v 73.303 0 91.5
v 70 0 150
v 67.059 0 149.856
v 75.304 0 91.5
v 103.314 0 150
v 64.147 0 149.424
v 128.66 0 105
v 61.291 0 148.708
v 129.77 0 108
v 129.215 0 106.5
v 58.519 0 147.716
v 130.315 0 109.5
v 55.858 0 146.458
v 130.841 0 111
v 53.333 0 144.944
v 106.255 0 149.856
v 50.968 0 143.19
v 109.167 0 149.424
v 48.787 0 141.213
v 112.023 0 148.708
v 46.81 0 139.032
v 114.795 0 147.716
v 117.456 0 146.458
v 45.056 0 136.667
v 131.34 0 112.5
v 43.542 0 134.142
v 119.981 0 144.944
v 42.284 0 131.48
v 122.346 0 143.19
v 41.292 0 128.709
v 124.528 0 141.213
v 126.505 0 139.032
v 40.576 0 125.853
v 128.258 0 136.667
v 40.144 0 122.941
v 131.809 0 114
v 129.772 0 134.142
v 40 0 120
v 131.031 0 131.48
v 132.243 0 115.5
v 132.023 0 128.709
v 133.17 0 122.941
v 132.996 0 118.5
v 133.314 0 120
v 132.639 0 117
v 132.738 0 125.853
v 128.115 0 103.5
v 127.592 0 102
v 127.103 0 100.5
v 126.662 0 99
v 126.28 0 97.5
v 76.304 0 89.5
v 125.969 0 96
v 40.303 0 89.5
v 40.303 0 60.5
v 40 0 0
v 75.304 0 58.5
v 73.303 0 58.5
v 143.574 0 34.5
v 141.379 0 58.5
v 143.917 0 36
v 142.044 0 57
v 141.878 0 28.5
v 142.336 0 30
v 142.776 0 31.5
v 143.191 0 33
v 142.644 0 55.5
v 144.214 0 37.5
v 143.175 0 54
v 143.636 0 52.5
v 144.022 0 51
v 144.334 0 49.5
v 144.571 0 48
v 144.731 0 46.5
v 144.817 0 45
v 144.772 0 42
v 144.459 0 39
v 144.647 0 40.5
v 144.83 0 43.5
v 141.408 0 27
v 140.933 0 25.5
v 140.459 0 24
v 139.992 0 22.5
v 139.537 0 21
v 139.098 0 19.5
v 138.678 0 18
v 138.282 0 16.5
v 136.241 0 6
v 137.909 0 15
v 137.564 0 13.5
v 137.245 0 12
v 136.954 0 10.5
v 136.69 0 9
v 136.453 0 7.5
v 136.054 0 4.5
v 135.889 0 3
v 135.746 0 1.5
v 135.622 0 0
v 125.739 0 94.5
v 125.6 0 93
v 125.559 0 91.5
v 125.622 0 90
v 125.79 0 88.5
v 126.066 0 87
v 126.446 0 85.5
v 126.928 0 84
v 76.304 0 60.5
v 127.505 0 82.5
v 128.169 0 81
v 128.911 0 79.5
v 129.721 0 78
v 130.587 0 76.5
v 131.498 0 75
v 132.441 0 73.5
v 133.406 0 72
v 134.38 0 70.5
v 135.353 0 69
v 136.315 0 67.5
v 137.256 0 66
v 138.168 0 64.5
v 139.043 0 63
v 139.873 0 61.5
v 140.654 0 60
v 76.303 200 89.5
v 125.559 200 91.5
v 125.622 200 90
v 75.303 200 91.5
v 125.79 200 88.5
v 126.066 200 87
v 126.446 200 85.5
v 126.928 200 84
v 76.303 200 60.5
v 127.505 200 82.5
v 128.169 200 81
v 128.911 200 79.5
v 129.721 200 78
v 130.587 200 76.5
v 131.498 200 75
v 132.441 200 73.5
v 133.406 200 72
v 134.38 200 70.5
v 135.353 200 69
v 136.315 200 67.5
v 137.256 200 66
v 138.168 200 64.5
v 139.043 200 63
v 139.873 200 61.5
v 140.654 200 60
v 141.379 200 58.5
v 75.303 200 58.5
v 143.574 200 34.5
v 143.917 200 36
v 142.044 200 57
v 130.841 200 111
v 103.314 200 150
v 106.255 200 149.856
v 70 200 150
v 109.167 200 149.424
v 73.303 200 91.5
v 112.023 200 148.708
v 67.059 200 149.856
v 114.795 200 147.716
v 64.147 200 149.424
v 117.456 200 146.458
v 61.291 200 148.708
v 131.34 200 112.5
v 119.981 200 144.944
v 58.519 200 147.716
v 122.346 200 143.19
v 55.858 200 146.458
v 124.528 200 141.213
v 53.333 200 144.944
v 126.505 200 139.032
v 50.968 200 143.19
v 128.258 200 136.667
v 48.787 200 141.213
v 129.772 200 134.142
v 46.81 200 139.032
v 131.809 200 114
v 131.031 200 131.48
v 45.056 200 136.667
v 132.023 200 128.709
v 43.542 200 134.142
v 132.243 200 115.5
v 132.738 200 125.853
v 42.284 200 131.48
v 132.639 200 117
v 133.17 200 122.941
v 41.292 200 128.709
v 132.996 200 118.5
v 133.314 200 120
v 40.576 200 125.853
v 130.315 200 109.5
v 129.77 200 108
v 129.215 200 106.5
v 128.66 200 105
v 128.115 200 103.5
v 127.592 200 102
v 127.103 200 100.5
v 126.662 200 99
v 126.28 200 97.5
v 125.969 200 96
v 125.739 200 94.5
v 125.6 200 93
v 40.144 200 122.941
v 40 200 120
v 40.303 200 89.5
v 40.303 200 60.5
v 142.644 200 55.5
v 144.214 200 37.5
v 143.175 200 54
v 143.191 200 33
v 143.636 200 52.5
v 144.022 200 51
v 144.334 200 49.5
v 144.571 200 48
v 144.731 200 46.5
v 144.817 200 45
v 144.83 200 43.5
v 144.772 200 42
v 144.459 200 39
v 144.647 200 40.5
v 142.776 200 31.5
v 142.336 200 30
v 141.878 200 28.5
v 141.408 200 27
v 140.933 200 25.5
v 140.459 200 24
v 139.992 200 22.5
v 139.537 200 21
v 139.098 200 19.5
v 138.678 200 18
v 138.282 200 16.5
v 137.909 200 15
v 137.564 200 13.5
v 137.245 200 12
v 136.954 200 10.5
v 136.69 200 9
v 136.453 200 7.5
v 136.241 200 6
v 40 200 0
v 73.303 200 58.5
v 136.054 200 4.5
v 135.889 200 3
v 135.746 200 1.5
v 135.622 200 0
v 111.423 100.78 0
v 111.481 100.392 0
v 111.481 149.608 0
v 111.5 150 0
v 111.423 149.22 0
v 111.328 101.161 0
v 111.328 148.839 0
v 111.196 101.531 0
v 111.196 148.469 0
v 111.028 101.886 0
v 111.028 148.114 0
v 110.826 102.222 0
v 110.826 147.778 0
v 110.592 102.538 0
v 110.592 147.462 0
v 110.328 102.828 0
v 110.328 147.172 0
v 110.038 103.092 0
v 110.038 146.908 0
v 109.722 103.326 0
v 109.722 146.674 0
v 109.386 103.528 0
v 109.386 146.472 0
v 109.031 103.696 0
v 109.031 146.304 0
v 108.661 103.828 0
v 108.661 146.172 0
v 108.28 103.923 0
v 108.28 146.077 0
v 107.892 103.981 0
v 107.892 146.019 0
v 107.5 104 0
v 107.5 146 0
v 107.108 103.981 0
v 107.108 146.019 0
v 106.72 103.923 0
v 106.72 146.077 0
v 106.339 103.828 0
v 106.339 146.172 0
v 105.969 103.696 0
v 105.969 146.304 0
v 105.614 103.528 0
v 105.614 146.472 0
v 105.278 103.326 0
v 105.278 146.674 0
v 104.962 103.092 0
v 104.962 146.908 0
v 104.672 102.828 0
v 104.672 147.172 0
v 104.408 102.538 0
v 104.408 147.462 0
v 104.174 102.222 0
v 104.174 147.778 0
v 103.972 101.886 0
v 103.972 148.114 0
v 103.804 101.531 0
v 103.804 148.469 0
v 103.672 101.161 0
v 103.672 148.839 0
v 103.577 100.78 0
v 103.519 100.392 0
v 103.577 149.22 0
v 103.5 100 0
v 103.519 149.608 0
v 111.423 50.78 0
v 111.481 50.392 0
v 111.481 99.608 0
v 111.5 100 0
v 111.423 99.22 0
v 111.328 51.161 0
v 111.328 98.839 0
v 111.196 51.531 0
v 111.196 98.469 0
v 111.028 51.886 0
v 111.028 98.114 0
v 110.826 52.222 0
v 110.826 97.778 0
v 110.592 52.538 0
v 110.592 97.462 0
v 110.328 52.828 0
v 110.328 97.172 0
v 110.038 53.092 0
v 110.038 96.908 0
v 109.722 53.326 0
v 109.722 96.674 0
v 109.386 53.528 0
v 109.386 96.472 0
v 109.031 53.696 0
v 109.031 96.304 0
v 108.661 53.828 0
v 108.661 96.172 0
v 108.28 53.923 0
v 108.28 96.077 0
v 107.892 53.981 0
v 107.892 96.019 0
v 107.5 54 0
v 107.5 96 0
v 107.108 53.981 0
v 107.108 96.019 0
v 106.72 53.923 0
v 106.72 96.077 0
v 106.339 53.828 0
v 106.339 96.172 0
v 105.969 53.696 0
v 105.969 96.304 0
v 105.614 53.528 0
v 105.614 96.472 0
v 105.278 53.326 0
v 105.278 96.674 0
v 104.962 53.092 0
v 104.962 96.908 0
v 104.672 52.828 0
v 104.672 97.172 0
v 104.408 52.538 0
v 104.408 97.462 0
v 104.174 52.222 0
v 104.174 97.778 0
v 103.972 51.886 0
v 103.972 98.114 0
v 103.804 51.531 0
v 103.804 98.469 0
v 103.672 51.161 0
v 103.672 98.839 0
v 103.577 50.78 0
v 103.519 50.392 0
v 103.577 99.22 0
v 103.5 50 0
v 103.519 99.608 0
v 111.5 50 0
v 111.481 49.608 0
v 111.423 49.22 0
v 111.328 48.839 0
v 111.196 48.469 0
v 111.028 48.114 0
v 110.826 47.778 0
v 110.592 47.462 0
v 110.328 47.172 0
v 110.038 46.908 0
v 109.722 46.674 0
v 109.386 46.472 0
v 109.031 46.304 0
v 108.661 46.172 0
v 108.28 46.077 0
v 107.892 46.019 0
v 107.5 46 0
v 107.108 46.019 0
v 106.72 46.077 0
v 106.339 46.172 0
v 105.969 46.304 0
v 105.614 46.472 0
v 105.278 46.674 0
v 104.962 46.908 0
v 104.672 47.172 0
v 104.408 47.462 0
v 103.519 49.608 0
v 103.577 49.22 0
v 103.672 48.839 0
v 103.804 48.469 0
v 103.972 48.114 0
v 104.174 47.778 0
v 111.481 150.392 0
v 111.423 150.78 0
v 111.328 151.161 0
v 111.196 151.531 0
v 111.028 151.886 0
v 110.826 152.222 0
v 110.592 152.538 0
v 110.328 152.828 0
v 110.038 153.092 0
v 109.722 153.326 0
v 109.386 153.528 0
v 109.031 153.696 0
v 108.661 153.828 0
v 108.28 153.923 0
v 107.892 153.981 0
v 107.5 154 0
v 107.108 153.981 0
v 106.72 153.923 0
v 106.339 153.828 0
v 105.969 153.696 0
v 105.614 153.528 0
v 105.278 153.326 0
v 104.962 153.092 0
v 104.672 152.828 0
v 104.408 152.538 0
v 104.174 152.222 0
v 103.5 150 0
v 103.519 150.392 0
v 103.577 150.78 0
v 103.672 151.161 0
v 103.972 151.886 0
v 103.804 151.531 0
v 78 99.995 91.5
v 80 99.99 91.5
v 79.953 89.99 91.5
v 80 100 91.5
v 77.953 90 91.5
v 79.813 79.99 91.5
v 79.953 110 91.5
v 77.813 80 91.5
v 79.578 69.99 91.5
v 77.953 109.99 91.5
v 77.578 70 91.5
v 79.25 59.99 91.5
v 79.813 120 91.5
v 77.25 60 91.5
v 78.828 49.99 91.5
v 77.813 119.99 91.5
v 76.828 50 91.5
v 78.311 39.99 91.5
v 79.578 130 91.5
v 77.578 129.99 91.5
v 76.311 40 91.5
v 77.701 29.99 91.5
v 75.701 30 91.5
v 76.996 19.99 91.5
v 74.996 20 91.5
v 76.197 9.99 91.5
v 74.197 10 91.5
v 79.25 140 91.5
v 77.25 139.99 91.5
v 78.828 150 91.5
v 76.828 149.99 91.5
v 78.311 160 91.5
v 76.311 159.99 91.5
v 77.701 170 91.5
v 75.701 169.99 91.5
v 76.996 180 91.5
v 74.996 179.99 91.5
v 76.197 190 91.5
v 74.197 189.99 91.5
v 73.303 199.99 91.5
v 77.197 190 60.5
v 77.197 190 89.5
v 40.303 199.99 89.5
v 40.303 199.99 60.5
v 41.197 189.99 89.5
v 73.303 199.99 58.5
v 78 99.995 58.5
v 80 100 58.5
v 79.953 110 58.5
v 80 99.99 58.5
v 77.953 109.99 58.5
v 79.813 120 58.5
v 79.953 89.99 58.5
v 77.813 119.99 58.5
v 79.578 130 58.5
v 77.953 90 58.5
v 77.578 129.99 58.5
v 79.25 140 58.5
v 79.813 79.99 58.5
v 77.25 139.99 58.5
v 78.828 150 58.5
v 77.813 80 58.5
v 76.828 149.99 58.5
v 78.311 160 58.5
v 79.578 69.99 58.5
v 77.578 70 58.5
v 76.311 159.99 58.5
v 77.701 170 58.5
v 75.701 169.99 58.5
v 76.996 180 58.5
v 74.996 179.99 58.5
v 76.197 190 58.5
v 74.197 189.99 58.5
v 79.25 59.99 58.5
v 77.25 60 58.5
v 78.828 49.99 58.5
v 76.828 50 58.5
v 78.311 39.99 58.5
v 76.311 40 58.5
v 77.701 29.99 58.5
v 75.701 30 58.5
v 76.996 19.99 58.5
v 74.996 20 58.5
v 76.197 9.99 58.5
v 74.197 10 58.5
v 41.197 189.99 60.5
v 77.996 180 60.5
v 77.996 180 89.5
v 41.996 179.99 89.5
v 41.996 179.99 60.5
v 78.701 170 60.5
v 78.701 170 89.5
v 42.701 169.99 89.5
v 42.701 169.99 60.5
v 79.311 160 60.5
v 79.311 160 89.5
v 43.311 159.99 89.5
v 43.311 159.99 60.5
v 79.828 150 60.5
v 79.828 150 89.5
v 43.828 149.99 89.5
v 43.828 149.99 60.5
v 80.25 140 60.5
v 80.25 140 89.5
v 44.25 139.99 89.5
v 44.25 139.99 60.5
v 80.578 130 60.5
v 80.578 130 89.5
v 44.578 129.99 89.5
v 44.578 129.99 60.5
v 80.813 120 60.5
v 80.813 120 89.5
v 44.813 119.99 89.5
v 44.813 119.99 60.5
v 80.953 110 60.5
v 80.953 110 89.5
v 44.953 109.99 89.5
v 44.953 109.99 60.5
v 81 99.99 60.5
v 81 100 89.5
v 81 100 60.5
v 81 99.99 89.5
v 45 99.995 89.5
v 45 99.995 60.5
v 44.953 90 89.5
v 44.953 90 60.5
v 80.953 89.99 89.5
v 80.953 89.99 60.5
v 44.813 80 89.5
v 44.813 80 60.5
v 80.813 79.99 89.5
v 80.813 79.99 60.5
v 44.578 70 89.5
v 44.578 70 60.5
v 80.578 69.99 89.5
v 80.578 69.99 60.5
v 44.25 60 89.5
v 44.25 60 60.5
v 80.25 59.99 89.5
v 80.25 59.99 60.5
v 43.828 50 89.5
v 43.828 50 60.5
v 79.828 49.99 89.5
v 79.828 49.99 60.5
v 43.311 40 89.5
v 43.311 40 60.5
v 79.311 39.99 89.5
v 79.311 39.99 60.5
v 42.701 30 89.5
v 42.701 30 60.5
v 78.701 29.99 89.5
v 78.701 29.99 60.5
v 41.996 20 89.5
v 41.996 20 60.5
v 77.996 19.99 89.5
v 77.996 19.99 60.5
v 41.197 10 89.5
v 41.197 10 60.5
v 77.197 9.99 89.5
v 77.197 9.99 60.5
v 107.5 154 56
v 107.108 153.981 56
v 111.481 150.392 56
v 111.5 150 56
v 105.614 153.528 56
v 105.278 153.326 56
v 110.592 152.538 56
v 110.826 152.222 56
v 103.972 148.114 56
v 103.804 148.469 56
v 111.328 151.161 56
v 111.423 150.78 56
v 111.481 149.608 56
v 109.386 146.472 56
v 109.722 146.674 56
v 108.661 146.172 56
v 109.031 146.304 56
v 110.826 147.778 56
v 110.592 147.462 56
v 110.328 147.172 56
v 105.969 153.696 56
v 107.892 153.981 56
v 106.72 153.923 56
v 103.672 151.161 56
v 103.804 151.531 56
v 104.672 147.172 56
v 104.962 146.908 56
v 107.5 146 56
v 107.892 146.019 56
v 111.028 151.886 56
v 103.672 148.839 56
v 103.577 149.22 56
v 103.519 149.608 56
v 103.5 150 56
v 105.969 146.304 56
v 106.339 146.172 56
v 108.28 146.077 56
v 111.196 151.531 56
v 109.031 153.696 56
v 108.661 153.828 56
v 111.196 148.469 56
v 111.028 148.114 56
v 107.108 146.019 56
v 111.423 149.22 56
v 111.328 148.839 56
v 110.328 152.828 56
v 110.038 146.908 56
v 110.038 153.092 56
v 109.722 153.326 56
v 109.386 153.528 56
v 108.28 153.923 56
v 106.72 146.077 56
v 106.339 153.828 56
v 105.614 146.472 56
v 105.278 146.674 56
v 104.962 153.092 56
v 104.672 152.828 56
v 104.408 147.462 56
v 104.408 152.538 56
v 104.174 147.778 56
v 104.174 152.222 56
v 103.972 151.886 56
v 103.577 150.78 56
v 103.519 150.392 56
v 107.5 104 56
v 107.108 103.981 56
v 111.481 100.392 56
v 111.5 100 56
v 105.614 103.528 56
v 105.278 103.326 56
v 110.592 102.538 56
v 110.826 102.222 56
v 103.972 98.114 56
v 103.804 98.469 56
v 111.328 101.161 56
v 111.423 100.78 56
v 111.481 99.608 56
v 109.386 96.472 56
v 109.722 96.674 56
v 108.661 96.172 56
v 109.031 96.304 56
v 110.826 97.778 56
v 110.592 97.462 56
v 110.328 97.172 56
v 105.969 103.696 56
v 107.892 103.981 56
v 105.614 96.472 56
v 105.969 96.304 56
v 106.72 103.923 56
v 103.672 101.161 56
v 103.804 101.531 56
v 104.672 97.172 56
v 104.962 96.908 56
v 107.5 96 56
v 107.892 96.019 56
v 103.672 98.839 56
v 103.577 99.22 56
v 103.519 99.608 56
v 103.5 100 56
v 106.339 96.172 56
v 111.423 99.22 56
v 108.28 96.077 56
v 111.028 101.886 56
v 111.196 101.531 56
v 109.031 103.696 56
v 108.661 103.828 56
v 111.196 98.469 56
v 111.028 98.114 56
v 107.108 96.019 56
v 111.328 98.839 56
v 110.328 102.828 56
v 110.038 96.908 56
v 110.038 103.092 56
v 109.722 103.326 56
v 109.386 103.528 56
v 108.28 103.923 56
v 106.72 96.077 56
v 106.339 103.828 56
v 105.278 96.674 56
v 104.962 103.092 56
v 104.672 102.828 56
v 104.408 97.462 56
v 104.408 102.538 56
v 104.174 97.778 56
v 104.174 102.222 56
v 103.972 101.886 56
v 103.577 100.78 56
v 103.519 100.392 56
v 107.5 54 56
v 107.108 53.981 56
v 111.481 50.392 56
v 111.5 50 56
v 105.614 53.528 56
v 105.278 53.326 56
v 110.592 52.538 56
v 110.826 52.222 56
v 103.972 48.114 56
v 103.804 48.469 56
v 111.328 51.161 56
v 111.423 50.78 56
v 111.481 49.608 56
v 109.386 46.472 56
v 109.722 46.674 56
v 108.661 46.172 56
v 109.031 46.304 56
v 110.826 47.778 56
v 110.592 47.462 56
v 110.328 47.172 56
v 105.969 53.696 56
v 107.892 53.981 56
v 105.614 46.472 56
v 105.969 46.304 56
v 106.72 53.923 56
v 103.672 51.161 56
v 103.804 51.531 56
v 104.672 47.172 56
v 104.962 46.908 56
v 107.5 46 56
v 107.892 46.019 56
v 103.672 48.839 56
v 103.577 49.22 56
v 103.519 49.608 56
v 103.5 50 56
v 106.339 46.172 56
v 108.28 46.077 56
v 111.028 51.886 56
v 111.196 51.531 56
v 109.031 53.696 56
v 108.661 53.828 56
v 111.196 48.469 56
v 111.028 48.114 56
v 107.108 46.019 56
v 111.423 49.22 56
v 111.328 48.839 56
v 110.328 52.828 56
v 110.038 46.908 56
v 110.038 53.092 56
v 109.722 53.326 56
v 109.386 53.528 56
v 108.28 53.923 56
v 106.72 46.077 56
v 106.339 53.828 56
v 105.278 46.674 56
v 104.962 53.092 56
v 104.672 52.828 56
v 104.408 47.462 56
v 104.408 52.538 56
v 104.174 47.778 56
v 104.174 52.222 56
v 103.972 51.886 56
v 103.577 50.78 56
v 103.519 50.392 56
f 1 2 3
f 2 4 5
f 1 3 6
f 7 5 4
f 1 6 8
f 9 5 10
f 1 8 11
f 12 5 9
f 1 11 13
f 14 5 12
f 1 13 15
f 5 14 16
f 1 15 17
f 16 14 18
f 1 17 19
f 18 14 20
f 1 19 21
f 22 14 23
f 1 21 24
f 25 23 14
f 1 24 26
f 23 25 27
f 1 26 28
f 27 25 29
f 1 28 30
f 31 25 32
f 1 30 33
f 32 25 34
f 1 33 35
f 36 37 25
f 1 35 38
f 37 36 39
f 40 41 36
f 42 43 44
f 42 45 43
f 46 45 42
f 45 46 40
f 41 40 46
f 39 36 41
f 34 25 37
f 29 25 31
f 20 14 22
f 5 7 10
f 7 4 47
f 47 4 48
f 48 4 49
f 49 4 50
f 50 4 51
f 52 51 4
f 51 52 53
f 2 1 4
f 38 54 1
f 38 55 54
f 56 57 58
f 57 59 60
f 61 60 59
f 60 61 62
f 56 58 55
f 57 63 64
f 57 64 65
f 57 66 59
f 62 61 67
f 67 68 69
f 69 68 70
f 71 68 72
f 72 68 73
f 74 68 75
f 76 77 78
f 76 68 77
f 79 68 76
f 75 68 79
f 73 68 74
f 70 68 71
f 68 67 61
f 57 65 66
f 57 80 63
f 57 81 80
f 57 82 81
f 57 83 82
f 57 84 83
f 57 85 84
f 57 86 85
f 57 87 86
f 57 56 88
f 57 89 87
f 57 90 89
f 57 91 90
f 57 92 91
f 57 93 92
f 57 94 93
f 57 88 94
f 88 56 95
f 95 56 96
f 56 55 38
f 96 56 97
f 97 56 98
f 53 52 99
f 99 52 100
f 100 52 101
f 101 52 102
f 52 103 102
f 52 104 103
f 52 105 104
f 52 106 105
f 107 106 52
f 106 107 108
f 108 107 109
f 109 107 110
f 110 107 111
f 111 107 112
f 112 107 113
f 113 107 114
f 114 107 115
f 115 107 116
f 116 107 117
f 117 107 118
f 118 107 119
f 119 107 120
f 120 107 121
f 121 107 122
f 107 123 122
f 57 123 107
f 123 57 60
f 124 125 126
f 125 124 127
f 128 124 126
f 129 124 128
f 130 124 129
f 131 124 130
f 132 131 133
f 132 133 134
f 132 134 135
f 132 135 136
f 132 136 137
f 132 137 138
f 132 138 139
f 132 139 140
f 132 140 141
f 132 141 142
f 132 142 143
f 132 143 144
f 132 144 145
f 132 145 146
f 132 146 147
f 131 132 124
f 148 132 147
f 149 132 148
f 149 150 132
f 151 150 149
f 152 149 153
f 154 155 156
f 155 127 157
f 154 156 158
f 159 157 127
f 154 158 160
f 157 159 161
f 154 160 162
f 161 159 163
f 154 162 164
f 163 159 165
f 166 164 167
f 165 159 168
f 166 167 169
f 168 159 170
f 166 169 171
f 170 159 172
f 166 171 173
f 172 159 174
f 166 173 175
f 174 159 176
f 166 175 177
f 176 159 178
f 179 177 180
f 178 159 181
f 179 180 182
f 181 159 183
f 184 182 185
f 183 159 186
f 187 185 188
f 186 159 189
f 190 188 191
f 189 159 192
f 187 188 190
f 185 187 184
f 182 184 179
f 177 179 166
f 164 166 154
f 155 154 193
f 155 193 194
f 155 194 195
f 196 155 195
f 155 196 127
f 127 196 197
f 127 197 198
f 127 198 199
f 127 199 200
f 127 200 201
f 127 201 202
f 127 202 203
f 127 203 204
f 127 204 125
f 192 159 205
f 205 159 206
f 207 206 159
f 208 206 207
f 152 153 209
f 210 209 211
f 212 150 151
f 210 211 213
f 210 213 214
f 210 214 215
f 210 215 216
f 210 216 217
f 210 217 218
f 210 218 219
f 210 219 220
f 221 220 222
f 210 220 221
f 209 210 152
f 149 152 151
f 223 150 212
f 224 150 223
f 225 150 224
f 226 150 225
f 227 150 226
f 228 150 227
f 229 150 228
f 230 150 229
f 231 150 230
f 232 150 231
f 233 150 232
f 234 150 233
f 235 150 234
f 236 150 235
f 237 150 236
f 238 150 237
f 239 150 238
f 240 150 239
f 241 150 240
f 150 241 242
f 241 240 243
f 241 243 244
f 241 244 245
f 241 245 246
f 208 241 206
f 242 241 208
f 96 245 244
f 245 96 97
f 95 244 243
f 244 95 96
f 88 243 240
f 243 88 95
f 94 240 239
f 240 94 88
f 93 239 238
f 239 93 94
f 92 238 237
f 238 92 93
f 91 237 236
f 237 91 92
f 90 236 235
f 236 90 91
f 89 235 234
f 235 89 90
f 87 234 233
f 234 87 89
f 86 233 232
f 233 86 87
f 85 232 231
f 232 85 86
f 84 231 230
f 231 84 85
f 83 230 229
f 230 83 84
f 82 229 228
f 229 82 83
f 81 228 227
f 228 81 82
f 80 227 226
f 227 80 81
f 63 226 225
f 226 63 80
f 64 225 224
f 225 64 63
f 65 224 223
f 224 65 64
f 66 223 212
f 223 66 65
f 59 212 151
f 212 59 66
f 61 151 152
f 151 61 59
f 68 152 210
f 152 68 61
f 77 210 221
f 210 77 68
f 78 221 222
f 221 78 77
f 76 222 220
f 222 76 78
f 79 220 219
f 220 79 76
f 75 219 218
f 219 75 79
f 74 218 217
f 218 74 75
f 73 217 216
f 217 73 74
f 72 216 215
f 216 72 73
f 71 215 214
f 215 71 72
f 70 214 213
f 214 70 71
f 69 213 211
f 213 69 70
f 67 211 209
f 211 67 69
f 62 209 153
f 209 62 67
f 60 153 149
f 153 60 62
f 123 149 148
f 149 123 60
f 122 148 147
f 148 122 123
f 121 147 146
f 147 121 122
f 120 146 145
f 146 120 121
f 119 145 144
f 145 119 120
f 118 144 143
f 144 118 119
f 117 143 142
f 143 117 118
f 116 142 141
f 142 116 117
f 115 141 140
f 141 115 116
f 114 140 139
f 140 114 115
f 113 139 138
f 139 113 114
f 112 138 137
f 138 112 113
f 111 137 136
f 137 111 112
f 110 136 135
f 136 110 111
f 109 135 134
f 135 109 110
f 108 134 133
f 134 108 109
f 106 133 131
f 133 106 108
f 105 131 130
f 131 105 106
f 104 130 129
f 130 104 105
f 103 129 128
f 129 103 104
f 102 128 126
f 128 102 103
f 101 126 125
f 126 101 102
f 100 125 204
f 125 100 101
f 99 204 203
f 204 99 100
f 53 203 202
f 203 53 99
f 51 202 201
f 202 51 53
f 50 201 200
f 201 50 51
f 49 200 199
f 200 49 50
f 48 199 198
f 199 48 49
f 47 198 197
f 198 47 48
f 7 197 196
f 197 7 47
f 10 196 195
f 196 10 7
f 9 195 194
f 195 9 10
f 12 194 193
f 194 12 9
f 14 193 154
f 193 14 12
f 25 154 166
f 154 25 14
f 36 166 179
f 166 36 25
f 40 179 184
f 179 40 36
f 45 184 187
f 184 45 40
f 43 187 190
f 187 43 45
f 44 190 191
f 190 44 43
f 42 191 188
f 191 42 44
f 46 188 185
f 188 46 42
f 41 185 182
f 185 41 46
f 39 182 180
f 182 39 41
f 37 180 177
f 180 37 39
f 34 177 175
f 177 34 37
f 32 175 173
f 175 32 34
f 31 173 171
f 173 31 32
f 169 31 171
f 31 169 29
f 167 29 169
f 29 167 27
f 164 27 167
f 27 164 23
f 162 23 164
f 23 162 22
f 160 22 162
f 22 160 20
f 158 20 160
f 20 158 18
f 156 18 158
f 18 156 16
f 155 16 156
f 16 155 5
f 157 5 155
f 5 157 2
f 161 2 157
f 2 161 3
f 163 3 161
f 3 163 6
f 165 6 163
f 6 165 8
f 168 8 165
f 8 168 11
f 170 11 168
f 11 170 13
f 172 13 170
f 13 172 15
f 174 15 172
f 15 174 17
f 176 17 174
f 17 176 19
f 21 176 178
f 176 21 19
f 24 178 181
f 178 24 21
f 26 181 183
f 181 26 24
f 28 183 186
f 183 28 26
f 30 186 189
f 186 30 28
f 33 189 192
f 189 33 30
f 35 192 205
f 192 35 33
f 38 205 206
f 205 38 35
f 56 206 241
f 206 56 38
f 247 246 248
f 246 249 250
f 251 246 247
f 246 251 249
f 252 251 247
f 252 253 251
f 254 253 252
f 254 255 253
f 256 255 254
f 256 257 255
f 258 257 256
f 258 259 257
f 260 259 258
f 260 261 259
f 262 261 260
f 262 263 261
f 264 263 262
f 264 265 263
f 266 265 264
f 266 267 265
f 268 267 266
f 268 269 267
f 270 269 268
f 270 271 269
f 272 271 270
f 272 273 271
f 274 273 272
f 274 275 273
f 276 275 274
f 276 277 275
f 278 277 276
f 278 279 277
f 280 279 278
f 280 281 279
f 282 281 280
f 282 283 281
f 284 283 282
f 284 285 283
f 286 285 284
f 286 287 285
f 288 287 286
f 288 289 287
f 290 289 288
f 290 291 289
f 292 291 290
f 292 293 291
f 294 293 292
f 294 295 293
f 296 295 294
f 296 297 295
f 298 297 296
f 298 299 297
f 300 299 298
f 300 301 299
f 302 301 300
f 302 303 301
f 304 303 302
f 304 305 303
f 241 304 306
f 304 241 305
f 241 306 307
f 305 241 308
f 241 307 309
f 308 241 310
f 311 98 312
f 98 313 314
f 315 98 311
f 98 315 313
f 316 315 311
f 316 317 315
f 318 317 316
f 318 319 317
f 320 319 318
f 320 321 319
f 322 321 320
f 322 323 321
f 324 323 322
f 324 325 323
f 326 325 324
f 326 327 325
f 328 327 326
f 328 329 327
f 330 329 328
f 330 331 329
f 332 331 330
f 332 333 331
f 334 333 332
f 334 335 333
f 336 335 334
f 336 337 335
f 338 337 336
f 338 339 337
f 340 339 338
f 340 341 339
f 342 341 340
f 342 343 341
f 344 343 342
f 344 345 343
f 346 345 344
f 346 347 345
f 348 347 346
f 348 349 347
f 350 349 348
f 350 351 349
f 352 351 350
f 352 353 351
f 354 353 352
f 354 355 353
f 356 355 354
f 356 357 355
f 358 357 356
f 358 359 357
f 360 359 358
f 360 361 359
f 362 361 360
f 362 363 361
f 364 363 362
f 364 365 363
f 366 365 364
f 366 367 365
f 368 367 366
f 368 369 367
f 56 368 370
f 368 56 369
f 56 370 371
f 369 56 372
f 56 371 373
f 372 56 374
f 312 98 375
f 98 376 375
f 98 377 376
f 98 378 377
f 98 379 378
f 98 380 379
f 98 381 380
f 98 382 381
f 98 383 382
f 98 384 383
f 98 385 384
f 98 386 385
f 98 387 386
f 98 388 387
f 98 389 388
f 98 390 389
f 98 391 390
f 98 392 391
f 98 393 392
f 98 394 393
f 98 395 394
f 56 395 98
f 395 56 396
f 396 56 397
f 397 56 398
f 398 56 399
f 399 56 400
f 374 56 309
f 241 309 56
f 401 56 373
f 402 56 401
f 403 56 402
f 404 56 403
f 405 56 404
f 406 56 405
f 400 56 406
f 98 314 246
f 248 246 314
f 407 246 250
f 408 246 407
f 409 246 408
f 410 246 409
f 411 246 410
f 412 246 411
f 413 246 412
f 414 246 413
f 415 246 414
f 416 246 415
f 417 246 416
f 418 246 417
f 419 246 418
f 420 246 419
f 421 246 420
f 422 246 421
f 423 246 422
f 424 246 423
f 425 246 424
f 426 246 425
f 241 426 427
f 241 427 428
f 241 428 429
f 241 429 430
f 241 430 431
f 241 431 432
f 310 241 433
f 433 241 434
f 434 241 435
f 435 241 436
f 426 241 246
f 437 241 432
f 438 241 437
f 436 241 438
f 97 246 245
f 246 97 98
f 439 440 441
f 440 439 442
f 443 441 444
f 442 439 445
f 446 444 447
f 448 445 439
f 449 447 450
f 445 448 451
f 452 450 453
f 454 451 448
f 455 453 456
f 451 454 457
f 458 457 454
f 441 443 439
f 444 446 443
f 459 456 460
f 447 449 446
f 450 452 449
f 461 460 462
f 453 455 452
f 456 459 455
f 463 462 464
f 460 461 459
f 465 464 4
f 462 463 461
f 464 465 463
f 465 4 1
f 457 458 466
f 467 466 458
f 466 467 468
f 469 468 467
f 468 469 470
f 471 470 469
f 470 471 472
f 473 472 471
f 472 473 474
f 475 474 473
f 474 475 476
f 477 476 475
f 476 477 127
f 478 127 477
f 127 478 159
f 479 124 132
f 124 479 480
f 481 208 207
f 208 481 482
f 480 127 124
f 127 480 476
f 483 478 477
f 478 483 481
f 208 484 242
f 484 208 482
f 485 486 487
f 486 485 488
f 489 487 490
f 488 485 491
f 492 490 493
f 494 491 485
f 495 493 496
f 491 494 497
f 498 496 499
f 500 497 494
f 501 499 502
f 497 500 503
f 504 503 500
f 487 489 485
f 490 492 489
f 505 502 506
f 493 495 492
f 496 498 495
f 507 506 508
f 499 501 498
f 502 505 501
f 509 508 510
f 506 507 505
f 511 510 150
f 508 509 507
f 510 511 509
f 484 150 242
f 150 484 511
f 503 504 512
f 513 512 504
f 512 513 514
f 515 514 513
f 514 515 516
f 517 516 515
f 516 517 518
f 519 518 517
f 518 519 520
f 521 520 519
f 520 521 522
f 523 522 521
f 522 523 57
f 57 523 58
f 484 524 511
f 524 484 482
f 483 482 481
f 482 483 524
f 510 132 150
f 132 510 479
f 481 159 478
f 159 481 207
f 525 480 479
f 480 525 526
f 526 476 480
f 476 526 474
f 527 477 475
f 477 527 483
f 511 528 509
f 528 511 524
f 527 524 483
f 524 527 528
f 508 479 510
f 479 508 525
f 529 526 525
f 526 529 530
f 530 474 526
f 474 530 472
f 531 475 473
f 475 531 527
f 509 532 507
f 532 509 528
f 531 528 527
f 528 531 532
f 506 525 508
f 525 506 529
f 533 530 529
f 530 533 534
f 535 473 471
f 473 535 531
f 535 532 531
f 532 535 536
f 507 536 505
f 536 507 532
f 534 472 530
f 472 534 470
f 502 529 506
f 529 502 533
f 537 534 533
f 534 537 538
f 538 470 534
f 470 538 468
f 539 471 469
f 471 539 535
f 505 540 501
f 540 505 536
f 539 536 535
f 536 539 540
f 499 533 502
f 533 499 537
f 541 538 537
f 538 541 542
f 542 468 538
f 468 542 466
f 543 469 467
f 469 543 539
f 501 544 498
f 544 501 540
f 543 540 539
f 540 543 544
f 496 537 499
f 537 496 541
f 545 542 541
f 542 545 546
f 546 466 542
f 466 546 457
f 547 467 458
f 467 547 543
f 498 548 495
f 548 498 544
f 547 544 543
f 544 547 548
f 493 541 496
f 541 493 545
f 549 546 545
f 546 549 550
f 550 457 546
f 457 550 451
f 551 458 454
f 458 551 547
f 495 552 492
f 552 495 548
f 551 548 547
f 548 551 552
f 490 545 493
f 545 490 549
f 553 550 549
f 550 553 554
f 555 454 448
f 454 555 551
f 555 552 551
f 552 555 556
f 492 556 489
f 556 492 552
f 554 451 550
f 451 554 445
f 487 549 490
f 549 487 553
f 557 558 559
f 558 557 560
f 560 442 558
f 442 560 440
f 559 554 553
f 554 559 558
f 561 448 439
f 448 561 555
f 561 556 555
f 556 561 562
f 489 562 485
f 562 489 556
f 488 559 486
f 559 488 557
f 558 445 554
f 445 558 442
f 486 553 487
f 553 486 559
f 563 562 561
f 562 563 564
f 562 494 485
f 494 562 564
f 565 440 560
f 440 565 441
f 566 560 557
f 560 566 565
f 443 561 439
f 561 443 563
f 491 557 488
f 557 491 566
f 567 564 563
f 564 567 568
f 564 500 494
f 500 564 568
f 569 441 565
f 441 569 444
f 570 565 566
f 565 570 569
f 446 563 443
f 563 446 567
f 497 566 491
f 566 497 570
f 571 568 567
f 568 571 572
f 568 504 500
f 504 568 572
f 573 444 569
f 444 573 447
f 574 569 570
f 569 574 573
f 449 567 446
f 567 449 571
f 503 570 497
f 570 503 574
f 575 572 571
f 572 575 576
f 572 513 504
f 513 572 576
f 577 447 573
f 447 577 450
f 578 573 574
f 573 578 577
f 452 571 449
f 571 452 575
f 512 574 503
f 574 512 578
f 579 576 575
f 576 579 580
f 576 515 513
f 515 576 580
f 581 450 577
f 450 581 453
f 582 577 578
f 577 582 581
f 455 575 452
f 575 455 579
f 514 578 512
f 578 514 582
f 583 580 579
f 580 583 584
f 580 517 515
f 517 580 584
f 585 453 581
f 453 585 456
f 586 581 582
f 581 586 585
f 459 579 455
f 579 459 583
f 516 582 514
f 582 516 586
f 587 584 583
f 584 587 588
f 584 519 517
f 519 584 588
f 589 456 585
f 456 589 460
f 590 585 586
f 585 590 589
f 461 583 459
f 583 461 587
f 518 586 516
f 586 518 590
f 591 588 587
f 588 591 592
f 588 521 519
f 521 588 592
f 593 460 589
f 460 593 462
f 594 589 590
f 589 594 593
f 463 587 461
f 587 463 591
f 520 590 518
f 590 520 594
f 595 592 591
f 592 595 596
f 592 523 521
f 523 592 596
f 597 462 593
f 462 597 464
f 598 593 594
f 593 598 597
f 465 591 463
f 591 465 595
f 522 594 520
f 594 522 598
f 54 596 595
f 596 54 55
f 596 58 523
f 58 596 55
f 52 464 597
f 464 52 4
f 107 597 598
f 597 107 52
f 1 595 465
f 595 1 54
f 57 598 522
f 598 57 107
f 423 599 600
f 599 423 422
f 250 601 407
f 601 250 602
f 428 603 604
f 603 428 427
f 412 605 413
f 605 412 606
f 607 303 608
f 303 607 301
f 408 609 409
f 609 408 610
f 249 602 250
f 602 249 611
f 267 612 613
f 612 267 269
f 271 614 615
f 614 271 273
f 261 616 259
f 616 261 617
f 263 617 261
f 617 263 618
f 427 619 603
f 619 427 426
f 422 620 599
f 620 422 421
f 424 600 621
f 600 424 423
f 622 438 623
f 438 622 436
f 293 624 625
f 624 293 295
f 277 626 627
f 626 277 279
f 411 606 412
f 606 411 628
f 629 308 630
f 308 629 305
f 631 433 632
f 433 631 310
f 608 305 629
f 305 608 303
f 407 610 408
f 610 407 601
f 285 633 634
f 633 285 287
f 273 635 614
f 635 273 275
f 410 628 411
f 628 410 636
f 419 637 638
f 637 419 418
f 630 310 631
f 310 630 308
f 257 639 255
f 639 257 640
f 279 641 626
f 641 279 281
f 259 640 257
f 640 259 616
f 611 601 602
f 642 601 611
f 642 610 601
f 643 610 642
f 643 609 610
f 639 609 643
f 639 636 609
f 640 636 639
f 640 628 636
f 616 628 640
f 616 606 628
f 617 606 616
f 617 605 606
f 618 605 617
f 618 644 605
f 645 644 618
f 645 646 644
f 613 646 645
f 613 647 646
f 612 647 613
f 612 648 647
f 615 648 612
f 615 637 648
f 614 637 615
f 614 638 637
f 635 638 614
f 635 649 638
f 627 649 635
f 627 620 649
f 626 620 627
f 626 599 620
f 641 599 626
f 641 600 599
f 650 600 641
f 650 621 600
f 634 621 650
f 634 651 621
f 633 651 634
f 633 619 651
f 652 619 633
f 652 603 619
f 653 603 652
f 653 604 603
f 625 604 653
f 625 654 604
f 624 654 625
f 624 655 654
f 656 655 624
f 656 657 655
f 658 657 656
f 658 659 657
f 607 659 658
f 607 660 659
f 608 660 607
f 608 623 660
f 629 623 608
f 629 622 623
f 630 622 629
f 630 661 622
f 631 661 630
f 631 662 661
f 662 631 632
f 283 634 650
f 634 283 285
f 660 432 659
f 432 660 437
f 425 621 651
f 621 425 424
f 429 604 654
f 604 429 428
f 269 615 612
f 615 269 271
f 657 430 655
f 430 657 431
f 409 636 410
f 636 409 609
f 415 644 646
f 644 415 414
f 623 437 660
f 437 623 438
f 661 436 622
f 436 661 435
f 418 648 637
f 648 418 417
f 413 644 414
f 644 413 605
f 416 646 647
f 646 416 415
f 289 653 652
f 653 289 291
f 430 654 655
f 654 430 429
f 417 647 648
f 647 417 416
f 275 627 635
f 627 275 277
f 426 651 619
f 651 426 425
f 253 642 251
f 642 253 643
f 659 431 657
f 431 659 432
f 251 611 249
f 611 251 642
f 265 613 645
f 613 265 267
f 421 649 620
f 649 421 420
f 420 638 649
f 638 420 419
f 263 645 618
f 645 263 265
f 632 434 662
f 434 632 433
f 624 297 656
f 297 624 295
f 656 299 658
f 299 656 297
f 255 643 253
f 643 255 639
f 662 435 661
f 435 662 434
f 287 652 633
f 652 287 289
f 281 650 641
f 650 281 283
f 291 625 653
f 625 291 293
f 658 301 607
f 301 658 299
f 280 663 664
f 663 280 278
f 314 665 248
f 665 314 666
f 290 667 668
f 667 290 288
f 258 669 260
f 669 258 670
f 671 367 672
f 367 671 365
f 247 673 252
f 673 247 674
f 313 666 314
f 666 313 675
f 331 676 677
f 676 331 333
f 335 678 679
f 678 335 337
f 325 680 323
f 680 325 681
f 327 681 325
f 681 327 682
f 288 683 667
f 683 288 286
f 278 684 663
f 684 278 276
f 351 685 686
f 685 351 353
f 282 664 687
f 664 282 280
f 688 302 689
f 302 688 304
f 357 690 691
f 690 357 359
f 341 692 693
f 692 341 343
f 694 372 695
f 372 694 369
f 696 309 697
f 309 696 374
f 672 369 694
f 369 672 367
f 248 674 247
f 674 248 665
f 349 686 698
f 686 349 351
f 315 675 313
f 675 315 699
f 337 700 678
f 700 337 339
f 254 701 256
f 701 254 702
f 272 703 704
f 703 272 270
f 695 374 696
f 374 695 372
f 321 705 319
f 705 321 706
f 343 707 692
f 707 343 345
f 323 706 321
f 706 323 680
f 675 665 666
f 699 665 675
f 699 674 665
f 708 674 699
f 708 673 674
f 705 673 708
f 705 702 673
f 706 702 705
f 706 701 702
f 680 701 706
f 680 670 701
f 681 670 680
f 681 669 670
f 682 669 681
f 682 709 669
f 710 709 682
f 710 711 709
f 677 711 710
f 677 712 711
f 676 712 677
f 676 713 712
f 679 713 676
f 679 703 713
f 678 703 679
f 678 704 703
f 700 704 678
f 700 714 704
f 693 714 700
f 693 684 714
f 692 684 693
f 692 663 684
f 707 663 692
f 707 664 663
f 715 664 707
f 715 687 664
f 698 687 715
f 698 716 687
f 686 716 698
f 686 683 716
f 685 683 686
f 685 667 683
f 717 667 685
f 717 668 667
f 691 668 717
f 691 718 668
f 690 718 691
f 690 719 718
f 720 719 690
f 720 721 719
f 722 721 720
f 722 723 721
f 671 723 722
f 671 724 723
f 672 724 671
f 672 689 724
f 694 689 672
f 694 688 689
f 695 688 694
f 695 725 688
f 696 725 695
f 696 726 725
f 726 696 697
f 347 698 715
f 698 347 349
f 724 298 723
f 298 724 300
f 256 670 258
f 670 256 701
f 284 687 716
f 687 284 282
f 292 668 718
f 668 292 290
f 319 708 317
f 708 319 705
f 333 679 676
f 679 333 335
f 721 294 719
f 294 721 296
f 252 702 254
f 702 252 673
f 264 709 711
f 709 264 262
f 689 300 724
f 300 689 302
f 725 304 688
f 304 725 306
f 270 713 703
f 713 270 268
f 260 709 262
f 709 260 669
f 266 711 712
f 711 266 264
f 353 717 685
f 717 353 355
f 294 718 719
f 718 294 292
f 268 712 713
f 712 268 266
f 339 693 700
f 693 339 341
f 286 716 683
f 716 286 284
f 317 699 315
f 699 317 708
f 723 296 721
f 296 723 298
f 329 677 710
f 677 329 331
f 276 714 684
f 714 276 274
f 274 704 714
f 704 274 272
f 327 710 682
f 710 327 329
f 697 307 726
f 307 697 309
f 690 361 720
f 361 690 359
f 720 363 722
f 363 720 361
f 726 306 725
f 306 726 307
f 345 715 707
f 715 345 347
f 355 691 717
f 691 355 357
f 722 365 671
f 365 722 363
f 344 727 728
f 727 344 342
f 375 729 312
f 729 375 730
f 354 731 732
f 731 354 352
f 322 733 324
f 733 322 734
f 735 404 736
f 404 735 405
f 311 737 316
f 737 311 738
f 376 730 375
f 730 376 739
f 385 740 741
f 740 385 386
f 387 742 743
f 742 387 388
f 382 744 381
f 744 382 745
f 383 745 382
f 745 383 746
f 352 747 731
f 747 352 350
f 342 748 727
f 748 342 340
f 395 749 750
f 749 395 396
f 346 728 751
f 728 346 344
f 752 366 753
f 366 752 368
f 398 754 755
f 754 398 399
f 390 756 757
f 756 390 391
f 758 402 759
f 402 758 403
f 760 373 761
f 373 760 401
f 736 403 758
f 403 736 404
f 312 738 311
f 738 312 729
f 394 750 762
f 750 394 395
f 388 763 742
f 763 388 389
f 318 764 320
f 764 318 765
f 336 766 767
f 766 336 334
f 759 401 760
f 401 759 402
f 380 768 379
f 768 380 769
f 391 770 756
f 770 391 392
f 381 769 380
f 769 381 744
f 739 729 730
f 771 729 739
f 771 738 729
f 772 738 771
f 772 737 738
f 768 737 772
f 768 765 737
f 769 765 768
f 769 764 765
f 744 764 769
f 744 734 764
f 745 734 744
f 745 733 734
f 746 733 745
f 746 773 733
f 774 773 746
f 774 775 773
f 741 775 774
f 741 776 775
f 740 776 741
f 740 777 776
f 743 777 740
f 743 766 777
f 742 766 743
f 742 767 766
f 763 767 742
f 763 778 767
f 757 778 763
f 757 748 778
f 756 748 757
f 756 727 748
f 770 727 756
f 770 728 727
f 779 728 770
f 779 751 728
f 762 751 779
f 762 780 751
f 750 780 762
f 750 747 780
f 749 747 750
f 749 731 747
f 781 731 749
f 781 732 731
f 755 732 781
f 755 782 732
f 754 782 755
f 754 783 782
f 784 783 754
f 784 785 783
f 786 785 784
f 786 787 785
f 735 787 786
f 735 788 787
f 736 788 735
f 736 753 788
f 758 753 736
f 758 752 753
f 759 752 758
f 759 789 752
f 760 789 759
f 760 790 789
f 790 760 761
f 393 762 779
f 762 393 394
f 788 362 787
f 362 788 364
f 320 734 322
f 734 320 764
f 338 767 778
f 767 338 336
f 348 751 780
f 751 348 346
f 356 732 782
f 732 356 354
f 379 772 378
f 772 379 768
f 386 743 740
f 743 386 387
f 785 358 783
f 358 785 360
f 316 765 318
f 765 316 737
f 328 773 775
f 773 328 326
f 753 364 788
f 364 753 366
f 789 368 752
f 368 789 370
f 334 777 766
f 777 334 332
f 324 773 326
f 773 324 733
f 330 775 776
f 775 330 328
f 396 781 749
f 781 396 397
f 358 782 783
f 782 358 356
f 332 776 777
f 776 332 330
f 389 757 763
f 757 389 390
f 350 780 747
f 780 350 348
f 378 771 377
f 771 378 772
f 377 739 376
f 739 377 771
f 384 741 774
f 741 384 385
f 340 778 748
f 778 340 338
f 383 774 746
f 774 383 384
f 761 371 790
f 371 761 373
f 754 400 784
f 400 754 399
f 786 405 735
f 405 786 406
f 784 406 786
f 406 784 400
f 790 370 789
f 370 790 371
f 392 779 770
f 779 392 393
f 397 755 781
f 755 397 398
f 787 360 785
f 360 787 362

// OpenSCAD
// ============================================================================
// Spa Headrest — v002
// Solid-body redesign with curved tile slot
// Material: PETG  |  Printer: Bambu Lab H2D
// ============================================================================
//
// Coordinate system (2D profile in XY, extruded along Z):
//   X = depth (0 at slot spine, positive toward person/spa interior)
//   Y = height (0 at pad bottom, positive upward)
//   Z = width (0 to pad_width, along tile edge)
//
// v002 changes from v001:
//   - Solid body (no inner cavity, no internal ribs)
//   - Curved slot following tile's 7' diameter arc (R=1066.8 mm)
//   - Reduced pad dimensions: 200×150×55 (was 250×200×80)
//   - Slot gap widened to 29.0 mm (was 28.8)
//   - Drain holes penetrate full solid depth
//
// After extrusion, rotate so Y->Z for print orientation (bottom on bed).
// ============================================================================

$fn = 64;

// ── Tile parameters ─────────────────────────────────────────────────────────
tile_thickness    = 29.32;   // measured tile thickness (mm)
tile_overhang     = 40;      // tile overhang into spa (mm)

// ── Slot parameters ─────────────────────────────────────────────────────────
slot_gap          = 29.0;    // clearance gap for tile (mm) — was 28.8
slot_depth        = 40;      // slot arm length from spine (mm)
slot_arm_thick    = 5;       // arm thickness (mm)
slot_chamfer      = 2;       // entry flare on gap opening (mm)
fric_rib_h        = 0.4;     // friction rib height (mm)
fric_rib_spacing  = 2;       // friction rib center-to-center (mm)
fric_rib_w        = 1.0;     // friction rib width (mm)

// ── Curvature ───────────────────────────────────────────────────────────────
slot_arc_radius   = 1066.8;  // 7' diameter / 2 (mm)

// ── Pad parameters (reduced from v001) ──────────────────────────────────────
pad_width         = 200;     // width along tile edge — Z axis (mm) — was 250
pad_height        = 150;     // total pad height — Y axis (mm) — was 200
pad_depth         = 55;      // depth from back wall to front baseline — X axis (mm) — was 80
corner_radius     = 30;      // outer profile corner radius (mm) — was 40

// ── Contour parameters ─────────────────────────────────────────────────────
head_bulge        = 10;      // head region convex bump (mm)
neck_dip          = 10;      // neck region concave dip (mm) — was 12
head_center_frac  = 0.30;    // head bump center as fraction of pad_height
neck_center_frac  = 0.60;    // neck dip center as fraction of pad_height
head_sigma_frac   = 0.18;    // head Gaussian spread fraction
neck_sigma_frac   = 0.15;    // neck Gaussian spread fraction

// ── Drainage ────────────────────────────────────────────────────────────────
drain_hole_d      = 8;       // bottom drain hole diameter (mm)
drain_hole_n      = 3;       // number of bottom drain holes

// ── Derived ─────────────────────────────────────────────────────────────────
slot_total_h      = 2 * slot_arm_thick + slot_gap;  // total slot height
pad_below         = pad_height / 2;                  // pad below slot center
pad_above         = pad_height / 2;                  // pad above slot center
slot_y_start      = pad_below - slot_total_h / 2;    // Y where slot bottom arm begins
slot_y_end        = slot_y_start + slot_total_h;      // Y where slot top arm ends
bot_inner_y       = slot_y_start + slot_arm_thick;    // tile bottom surface Y
top_inner_y       = bot_inner_y + slot_gap;           // tile top surface Y

// Contour derived
head_center_y     = head_center_frac * pad_height;
neck_center_y     = neck_center_frac * pad_height;
head_sigma        = head_sigma_frac * pad_height;
neck_sigma        = neck_sigma_frac * pad_height;

// Sagitta: max arc deviation from flat at center of width
sagitta = slot_arc_radius - sqrt(slot_arc_radius * slot_arc_radius
          - (pad_width / 2) * (pad_width / 2));

// Function: X offset to follow tile arc at a given Z position
// Returns 0 at center, -sagitta at edges
function arc_dx(z) =
    let(dz = z - pad_width / 2)
    -slot_arc_radius + sqrt(slot_arc_radius * slot_arc_radius - dz * dz);

// ── Assertions ──────────────────────────────────────────────────────────────
assert(slot_depth <= tile_overhang, "Slot depth exceeds tile overhang");
assert(slot_y_start > 0, "Slot extends below pad bottom");
assert(slot_y_end < pad_height, "Slot extends above pad top");
assert(pad_width / 2 < slot_arc_radius, "Pad width exceeds arc diameter");
assert(slot_gap > 0, "Slot gap must be positive");
assert(corner_radius < pad_height / 2, "Corner radius too large for pad height");
assert(corner_radius < (pad_depth + head_bulge) / 2, "Corner radius too large for pad depth");

// ============================================================================
// FUNCTION: contour_x — front surface X position at a given Y height
// Two-Gaussian model: head bulge (convex) + neck dip (concave)
// ============================================================================
function contour_x(y) =
    slot_depth + pad_depth
    + head_bulge * exp(-pow((y - head_center_y) / head_sigma, 2))
    - neck_dip   * exp(-pow((y - neck_center_y) / neck_sigma, 2));

// ============================================================================
// MODULE: pad_profile_2d — solid outer 2D profile of the pad body
// Extends from X=0 (spine) to contoured front, includes slot arm area
// Back wall at X=0 (same as slot spine), contoured front, Y from 0 to pad_height
// ============================================================================
module pad_profile_2d() {
    contour_steps = 80;
    corner_steps  = 16;

    // Front contour points (bottom to top, stopping at corner transition)
    contour_top_y = pad_height - corner_radius;
    front_pts = [
        for (i = [1:contour_steps-1])
            let(y = i * contour_top_y / contour_steps)
            [contour_x(y), y]
    ];

    // Top-right rounded corner: arc from 0deg to 90deg
    tr_cx = contour_x(contour_top_y) - corner_radius;
    tr_cy = contour_top_y;
    top_right_arc = [
        for (i = [0:corner_steps])
            let(a = 90 * i / corner_steps)
            [tr_cx + corner_radius * cos(a), tr_cy + corner_radius * sin(a)]
    ];

    // Top-left rounded corner: arc from 90deg to 180deg
    // Back edge is at X=0 (spine), so corner center at X=corner_radius
    tl_cx = corner_radius;
    tl_cy = pad_height - corner_radius;
    top_left_arc = [
        for (i = [0:corner_steps])
            let(a = 90 + 90 * i / corner_steps)
            [tl_cx + corner_radius * cos(a), tl_cy + corner_radius * sin(a)]
    ];

    // Back edge at X=0, bottom corners square
    polygon(concat(
        [[0, 0]],                                   // bottom-left (back at spine)
        [[contour_x(0), 0]],                        // bottom-right (front)
        front_pts,                                   // contour from bottom to top
        [[contour_x(contour_top_y), contour_top_y]], // explicit endpoint at arc join
        top_right_arc,                               // top-right rounded corner
        top_left_arc                                 // top-left rounded corner
    ));
}

// ============================================================================
// MODULE: slot_gap_2d — the gap where the tile inserts (subtracted from body)
// Rectangle representing the open channel between the arms
// ============================================================================
module slot_gap_2d() {
    // The gap between the two arms, open to the right (toward person)
    // Extends from spine (X = slot_arm_thick) to beyond slot_depth
    translate([slot_arm_thick, bot_inner_y])
        square([slot_depth - slot_arm_thick + 1, slot_gap]);
}

// ============================================================================
// MODULE: slot_chamfers_2d — entry chamfer cuts to widen gap opening
// ============================================================================
module slot_chamfers_2d() {
    c = slot_chamfer;

    // Bottom arm inner corner (widens gap entry)
    translate([slot_depth - c, bot_inner_y - c])
        polygon([[0, 0], [c, 0], [c, c]]);

    // Top arm inner corner (widens gap entry)
    translate([slot_depth - c, top_inner_y])
        polygon([[0, c], [c, 0], [c, c]]);
}

// ============================================================================
// MODULE: drain_holes — cylindrical holes through solid pad bottom
// Full penetration through solid body
// ============================================================================
module drain_holes() {
    spacing = pad_width / (drain_hole_n + 1);
    hole_x = slot_depth + pad_depth / 2;  // centered in pad body depth

    for (i = [1:drain_hole_n]) {
        z = i * spacing;
        translate([hole_x, -1, z])
            rotate([-90, 0, 0])
                cylinder(d = drain_hole_d, h = pad_depth + 2);
    }
}

// ============================================================================
// MODULE: friction_ribs — small bumps on slot arm inner surfaces
// Ribs stop before the chamfer zone to avoid non-manifold edges
// ============================================================================
module friction_ribs() {
    // Bottom arm ribs (protrude upward into gap, facing tile)
    num_bot = floor((slot_depth - slot_arm_thick) / fric_rib_spacing);
    for (i = [1:num_bot]) {
        x = slot_arm_thick + i * fric_rib_spacing;
        if (x + fric_rib_w <= slot_depth - slot_chamfer) {
            translate([x, bot_inner_y, 0])
                cube([fric_rib_w, fric_rib_h, pad_width]);
        }
    }

    // Top arm ribs (protrude downward into gap, facing tile)
    num_top = floor((slot_depth - slot_arm_thick) / fric_rib_spacing);
    for (i = [1:num_top]) {
        x = slot_arm_thick + i * fric_rib_spacing;
        if (x + fric_rib_w <= slot_depth - slot_chamfer) {
            translate([x, top_inner_y - fric_rib_h, 0])
                cube([fric_rib_w, fric_rib_h, pad_width]);
        }
    }
}

// ============================================================================
// MODULE: curved_gap_3d — the slot gap carved out, following tile arc
// Built from hull-connected slices of the gap profile, shifted by arc_dx(z)
// ============================================================================
curve_slices = 20;  // number of slices for arc approximation

module curved_gap_3d() {
    for (i = [0:curve_slices-1]) {
        z0 = i * pad_width / curve_slices;
        z1 = (i + 1) * pad_width / curve_slices;
        hull() {
            translate([arc_dx(z0), 0, z0])
                linear_extrude(0.01)
                    union() { slot_gap_2d(); slot_chamfers_2d(); }
            translate([arc_dx(z1), 0, z1])
                linear_extrude(0.01)
                    union() { slot_gap_2d(); slot_chamfers_2d(); }
        }
    }
}

// ============================================================================
// MODULE: spa_headrest — complete 3D assembly
// Solid pad body with curved slot, gussets, and friction ribs
// No inner cavity — body is completely solid for clean printing
// ============================================================================
module spa_headrest() {
    difference() {
        union() {
            // Solid body: pad profile extends from X=0 (spine) to contoured front
            // This single extrusion includes the slot arms and pad body as one piece
            linear_extrude(pad_width)
                pad_profile_2d();
            // Friction ribs on slot inner surfaces
            friction_ribs();
        }
        // Subtract the slot gap (curved to follow tile arc)
        curved_gap_3d();
        // Subtract drain holes
        drain_holes();
    }
}

// ============================================================================
// RENDER — rotate to print orientation
// After extrude: X=depth, Y=height, Z=width
// Print orientation: rotate so Y->Z (height = vertical up)
//   rotate([90,0,0]): X->X, Y->-Z, Z->Y  ->  then translate Y by +pad_width
// Result: X=depth, Y=width(0..200), Z=height(0..~150), base at Z=0
// ============================================================================
translate([slot_depth, pad_width, 0])
    rotate([90, 0, 0])
        spa_headrest();
